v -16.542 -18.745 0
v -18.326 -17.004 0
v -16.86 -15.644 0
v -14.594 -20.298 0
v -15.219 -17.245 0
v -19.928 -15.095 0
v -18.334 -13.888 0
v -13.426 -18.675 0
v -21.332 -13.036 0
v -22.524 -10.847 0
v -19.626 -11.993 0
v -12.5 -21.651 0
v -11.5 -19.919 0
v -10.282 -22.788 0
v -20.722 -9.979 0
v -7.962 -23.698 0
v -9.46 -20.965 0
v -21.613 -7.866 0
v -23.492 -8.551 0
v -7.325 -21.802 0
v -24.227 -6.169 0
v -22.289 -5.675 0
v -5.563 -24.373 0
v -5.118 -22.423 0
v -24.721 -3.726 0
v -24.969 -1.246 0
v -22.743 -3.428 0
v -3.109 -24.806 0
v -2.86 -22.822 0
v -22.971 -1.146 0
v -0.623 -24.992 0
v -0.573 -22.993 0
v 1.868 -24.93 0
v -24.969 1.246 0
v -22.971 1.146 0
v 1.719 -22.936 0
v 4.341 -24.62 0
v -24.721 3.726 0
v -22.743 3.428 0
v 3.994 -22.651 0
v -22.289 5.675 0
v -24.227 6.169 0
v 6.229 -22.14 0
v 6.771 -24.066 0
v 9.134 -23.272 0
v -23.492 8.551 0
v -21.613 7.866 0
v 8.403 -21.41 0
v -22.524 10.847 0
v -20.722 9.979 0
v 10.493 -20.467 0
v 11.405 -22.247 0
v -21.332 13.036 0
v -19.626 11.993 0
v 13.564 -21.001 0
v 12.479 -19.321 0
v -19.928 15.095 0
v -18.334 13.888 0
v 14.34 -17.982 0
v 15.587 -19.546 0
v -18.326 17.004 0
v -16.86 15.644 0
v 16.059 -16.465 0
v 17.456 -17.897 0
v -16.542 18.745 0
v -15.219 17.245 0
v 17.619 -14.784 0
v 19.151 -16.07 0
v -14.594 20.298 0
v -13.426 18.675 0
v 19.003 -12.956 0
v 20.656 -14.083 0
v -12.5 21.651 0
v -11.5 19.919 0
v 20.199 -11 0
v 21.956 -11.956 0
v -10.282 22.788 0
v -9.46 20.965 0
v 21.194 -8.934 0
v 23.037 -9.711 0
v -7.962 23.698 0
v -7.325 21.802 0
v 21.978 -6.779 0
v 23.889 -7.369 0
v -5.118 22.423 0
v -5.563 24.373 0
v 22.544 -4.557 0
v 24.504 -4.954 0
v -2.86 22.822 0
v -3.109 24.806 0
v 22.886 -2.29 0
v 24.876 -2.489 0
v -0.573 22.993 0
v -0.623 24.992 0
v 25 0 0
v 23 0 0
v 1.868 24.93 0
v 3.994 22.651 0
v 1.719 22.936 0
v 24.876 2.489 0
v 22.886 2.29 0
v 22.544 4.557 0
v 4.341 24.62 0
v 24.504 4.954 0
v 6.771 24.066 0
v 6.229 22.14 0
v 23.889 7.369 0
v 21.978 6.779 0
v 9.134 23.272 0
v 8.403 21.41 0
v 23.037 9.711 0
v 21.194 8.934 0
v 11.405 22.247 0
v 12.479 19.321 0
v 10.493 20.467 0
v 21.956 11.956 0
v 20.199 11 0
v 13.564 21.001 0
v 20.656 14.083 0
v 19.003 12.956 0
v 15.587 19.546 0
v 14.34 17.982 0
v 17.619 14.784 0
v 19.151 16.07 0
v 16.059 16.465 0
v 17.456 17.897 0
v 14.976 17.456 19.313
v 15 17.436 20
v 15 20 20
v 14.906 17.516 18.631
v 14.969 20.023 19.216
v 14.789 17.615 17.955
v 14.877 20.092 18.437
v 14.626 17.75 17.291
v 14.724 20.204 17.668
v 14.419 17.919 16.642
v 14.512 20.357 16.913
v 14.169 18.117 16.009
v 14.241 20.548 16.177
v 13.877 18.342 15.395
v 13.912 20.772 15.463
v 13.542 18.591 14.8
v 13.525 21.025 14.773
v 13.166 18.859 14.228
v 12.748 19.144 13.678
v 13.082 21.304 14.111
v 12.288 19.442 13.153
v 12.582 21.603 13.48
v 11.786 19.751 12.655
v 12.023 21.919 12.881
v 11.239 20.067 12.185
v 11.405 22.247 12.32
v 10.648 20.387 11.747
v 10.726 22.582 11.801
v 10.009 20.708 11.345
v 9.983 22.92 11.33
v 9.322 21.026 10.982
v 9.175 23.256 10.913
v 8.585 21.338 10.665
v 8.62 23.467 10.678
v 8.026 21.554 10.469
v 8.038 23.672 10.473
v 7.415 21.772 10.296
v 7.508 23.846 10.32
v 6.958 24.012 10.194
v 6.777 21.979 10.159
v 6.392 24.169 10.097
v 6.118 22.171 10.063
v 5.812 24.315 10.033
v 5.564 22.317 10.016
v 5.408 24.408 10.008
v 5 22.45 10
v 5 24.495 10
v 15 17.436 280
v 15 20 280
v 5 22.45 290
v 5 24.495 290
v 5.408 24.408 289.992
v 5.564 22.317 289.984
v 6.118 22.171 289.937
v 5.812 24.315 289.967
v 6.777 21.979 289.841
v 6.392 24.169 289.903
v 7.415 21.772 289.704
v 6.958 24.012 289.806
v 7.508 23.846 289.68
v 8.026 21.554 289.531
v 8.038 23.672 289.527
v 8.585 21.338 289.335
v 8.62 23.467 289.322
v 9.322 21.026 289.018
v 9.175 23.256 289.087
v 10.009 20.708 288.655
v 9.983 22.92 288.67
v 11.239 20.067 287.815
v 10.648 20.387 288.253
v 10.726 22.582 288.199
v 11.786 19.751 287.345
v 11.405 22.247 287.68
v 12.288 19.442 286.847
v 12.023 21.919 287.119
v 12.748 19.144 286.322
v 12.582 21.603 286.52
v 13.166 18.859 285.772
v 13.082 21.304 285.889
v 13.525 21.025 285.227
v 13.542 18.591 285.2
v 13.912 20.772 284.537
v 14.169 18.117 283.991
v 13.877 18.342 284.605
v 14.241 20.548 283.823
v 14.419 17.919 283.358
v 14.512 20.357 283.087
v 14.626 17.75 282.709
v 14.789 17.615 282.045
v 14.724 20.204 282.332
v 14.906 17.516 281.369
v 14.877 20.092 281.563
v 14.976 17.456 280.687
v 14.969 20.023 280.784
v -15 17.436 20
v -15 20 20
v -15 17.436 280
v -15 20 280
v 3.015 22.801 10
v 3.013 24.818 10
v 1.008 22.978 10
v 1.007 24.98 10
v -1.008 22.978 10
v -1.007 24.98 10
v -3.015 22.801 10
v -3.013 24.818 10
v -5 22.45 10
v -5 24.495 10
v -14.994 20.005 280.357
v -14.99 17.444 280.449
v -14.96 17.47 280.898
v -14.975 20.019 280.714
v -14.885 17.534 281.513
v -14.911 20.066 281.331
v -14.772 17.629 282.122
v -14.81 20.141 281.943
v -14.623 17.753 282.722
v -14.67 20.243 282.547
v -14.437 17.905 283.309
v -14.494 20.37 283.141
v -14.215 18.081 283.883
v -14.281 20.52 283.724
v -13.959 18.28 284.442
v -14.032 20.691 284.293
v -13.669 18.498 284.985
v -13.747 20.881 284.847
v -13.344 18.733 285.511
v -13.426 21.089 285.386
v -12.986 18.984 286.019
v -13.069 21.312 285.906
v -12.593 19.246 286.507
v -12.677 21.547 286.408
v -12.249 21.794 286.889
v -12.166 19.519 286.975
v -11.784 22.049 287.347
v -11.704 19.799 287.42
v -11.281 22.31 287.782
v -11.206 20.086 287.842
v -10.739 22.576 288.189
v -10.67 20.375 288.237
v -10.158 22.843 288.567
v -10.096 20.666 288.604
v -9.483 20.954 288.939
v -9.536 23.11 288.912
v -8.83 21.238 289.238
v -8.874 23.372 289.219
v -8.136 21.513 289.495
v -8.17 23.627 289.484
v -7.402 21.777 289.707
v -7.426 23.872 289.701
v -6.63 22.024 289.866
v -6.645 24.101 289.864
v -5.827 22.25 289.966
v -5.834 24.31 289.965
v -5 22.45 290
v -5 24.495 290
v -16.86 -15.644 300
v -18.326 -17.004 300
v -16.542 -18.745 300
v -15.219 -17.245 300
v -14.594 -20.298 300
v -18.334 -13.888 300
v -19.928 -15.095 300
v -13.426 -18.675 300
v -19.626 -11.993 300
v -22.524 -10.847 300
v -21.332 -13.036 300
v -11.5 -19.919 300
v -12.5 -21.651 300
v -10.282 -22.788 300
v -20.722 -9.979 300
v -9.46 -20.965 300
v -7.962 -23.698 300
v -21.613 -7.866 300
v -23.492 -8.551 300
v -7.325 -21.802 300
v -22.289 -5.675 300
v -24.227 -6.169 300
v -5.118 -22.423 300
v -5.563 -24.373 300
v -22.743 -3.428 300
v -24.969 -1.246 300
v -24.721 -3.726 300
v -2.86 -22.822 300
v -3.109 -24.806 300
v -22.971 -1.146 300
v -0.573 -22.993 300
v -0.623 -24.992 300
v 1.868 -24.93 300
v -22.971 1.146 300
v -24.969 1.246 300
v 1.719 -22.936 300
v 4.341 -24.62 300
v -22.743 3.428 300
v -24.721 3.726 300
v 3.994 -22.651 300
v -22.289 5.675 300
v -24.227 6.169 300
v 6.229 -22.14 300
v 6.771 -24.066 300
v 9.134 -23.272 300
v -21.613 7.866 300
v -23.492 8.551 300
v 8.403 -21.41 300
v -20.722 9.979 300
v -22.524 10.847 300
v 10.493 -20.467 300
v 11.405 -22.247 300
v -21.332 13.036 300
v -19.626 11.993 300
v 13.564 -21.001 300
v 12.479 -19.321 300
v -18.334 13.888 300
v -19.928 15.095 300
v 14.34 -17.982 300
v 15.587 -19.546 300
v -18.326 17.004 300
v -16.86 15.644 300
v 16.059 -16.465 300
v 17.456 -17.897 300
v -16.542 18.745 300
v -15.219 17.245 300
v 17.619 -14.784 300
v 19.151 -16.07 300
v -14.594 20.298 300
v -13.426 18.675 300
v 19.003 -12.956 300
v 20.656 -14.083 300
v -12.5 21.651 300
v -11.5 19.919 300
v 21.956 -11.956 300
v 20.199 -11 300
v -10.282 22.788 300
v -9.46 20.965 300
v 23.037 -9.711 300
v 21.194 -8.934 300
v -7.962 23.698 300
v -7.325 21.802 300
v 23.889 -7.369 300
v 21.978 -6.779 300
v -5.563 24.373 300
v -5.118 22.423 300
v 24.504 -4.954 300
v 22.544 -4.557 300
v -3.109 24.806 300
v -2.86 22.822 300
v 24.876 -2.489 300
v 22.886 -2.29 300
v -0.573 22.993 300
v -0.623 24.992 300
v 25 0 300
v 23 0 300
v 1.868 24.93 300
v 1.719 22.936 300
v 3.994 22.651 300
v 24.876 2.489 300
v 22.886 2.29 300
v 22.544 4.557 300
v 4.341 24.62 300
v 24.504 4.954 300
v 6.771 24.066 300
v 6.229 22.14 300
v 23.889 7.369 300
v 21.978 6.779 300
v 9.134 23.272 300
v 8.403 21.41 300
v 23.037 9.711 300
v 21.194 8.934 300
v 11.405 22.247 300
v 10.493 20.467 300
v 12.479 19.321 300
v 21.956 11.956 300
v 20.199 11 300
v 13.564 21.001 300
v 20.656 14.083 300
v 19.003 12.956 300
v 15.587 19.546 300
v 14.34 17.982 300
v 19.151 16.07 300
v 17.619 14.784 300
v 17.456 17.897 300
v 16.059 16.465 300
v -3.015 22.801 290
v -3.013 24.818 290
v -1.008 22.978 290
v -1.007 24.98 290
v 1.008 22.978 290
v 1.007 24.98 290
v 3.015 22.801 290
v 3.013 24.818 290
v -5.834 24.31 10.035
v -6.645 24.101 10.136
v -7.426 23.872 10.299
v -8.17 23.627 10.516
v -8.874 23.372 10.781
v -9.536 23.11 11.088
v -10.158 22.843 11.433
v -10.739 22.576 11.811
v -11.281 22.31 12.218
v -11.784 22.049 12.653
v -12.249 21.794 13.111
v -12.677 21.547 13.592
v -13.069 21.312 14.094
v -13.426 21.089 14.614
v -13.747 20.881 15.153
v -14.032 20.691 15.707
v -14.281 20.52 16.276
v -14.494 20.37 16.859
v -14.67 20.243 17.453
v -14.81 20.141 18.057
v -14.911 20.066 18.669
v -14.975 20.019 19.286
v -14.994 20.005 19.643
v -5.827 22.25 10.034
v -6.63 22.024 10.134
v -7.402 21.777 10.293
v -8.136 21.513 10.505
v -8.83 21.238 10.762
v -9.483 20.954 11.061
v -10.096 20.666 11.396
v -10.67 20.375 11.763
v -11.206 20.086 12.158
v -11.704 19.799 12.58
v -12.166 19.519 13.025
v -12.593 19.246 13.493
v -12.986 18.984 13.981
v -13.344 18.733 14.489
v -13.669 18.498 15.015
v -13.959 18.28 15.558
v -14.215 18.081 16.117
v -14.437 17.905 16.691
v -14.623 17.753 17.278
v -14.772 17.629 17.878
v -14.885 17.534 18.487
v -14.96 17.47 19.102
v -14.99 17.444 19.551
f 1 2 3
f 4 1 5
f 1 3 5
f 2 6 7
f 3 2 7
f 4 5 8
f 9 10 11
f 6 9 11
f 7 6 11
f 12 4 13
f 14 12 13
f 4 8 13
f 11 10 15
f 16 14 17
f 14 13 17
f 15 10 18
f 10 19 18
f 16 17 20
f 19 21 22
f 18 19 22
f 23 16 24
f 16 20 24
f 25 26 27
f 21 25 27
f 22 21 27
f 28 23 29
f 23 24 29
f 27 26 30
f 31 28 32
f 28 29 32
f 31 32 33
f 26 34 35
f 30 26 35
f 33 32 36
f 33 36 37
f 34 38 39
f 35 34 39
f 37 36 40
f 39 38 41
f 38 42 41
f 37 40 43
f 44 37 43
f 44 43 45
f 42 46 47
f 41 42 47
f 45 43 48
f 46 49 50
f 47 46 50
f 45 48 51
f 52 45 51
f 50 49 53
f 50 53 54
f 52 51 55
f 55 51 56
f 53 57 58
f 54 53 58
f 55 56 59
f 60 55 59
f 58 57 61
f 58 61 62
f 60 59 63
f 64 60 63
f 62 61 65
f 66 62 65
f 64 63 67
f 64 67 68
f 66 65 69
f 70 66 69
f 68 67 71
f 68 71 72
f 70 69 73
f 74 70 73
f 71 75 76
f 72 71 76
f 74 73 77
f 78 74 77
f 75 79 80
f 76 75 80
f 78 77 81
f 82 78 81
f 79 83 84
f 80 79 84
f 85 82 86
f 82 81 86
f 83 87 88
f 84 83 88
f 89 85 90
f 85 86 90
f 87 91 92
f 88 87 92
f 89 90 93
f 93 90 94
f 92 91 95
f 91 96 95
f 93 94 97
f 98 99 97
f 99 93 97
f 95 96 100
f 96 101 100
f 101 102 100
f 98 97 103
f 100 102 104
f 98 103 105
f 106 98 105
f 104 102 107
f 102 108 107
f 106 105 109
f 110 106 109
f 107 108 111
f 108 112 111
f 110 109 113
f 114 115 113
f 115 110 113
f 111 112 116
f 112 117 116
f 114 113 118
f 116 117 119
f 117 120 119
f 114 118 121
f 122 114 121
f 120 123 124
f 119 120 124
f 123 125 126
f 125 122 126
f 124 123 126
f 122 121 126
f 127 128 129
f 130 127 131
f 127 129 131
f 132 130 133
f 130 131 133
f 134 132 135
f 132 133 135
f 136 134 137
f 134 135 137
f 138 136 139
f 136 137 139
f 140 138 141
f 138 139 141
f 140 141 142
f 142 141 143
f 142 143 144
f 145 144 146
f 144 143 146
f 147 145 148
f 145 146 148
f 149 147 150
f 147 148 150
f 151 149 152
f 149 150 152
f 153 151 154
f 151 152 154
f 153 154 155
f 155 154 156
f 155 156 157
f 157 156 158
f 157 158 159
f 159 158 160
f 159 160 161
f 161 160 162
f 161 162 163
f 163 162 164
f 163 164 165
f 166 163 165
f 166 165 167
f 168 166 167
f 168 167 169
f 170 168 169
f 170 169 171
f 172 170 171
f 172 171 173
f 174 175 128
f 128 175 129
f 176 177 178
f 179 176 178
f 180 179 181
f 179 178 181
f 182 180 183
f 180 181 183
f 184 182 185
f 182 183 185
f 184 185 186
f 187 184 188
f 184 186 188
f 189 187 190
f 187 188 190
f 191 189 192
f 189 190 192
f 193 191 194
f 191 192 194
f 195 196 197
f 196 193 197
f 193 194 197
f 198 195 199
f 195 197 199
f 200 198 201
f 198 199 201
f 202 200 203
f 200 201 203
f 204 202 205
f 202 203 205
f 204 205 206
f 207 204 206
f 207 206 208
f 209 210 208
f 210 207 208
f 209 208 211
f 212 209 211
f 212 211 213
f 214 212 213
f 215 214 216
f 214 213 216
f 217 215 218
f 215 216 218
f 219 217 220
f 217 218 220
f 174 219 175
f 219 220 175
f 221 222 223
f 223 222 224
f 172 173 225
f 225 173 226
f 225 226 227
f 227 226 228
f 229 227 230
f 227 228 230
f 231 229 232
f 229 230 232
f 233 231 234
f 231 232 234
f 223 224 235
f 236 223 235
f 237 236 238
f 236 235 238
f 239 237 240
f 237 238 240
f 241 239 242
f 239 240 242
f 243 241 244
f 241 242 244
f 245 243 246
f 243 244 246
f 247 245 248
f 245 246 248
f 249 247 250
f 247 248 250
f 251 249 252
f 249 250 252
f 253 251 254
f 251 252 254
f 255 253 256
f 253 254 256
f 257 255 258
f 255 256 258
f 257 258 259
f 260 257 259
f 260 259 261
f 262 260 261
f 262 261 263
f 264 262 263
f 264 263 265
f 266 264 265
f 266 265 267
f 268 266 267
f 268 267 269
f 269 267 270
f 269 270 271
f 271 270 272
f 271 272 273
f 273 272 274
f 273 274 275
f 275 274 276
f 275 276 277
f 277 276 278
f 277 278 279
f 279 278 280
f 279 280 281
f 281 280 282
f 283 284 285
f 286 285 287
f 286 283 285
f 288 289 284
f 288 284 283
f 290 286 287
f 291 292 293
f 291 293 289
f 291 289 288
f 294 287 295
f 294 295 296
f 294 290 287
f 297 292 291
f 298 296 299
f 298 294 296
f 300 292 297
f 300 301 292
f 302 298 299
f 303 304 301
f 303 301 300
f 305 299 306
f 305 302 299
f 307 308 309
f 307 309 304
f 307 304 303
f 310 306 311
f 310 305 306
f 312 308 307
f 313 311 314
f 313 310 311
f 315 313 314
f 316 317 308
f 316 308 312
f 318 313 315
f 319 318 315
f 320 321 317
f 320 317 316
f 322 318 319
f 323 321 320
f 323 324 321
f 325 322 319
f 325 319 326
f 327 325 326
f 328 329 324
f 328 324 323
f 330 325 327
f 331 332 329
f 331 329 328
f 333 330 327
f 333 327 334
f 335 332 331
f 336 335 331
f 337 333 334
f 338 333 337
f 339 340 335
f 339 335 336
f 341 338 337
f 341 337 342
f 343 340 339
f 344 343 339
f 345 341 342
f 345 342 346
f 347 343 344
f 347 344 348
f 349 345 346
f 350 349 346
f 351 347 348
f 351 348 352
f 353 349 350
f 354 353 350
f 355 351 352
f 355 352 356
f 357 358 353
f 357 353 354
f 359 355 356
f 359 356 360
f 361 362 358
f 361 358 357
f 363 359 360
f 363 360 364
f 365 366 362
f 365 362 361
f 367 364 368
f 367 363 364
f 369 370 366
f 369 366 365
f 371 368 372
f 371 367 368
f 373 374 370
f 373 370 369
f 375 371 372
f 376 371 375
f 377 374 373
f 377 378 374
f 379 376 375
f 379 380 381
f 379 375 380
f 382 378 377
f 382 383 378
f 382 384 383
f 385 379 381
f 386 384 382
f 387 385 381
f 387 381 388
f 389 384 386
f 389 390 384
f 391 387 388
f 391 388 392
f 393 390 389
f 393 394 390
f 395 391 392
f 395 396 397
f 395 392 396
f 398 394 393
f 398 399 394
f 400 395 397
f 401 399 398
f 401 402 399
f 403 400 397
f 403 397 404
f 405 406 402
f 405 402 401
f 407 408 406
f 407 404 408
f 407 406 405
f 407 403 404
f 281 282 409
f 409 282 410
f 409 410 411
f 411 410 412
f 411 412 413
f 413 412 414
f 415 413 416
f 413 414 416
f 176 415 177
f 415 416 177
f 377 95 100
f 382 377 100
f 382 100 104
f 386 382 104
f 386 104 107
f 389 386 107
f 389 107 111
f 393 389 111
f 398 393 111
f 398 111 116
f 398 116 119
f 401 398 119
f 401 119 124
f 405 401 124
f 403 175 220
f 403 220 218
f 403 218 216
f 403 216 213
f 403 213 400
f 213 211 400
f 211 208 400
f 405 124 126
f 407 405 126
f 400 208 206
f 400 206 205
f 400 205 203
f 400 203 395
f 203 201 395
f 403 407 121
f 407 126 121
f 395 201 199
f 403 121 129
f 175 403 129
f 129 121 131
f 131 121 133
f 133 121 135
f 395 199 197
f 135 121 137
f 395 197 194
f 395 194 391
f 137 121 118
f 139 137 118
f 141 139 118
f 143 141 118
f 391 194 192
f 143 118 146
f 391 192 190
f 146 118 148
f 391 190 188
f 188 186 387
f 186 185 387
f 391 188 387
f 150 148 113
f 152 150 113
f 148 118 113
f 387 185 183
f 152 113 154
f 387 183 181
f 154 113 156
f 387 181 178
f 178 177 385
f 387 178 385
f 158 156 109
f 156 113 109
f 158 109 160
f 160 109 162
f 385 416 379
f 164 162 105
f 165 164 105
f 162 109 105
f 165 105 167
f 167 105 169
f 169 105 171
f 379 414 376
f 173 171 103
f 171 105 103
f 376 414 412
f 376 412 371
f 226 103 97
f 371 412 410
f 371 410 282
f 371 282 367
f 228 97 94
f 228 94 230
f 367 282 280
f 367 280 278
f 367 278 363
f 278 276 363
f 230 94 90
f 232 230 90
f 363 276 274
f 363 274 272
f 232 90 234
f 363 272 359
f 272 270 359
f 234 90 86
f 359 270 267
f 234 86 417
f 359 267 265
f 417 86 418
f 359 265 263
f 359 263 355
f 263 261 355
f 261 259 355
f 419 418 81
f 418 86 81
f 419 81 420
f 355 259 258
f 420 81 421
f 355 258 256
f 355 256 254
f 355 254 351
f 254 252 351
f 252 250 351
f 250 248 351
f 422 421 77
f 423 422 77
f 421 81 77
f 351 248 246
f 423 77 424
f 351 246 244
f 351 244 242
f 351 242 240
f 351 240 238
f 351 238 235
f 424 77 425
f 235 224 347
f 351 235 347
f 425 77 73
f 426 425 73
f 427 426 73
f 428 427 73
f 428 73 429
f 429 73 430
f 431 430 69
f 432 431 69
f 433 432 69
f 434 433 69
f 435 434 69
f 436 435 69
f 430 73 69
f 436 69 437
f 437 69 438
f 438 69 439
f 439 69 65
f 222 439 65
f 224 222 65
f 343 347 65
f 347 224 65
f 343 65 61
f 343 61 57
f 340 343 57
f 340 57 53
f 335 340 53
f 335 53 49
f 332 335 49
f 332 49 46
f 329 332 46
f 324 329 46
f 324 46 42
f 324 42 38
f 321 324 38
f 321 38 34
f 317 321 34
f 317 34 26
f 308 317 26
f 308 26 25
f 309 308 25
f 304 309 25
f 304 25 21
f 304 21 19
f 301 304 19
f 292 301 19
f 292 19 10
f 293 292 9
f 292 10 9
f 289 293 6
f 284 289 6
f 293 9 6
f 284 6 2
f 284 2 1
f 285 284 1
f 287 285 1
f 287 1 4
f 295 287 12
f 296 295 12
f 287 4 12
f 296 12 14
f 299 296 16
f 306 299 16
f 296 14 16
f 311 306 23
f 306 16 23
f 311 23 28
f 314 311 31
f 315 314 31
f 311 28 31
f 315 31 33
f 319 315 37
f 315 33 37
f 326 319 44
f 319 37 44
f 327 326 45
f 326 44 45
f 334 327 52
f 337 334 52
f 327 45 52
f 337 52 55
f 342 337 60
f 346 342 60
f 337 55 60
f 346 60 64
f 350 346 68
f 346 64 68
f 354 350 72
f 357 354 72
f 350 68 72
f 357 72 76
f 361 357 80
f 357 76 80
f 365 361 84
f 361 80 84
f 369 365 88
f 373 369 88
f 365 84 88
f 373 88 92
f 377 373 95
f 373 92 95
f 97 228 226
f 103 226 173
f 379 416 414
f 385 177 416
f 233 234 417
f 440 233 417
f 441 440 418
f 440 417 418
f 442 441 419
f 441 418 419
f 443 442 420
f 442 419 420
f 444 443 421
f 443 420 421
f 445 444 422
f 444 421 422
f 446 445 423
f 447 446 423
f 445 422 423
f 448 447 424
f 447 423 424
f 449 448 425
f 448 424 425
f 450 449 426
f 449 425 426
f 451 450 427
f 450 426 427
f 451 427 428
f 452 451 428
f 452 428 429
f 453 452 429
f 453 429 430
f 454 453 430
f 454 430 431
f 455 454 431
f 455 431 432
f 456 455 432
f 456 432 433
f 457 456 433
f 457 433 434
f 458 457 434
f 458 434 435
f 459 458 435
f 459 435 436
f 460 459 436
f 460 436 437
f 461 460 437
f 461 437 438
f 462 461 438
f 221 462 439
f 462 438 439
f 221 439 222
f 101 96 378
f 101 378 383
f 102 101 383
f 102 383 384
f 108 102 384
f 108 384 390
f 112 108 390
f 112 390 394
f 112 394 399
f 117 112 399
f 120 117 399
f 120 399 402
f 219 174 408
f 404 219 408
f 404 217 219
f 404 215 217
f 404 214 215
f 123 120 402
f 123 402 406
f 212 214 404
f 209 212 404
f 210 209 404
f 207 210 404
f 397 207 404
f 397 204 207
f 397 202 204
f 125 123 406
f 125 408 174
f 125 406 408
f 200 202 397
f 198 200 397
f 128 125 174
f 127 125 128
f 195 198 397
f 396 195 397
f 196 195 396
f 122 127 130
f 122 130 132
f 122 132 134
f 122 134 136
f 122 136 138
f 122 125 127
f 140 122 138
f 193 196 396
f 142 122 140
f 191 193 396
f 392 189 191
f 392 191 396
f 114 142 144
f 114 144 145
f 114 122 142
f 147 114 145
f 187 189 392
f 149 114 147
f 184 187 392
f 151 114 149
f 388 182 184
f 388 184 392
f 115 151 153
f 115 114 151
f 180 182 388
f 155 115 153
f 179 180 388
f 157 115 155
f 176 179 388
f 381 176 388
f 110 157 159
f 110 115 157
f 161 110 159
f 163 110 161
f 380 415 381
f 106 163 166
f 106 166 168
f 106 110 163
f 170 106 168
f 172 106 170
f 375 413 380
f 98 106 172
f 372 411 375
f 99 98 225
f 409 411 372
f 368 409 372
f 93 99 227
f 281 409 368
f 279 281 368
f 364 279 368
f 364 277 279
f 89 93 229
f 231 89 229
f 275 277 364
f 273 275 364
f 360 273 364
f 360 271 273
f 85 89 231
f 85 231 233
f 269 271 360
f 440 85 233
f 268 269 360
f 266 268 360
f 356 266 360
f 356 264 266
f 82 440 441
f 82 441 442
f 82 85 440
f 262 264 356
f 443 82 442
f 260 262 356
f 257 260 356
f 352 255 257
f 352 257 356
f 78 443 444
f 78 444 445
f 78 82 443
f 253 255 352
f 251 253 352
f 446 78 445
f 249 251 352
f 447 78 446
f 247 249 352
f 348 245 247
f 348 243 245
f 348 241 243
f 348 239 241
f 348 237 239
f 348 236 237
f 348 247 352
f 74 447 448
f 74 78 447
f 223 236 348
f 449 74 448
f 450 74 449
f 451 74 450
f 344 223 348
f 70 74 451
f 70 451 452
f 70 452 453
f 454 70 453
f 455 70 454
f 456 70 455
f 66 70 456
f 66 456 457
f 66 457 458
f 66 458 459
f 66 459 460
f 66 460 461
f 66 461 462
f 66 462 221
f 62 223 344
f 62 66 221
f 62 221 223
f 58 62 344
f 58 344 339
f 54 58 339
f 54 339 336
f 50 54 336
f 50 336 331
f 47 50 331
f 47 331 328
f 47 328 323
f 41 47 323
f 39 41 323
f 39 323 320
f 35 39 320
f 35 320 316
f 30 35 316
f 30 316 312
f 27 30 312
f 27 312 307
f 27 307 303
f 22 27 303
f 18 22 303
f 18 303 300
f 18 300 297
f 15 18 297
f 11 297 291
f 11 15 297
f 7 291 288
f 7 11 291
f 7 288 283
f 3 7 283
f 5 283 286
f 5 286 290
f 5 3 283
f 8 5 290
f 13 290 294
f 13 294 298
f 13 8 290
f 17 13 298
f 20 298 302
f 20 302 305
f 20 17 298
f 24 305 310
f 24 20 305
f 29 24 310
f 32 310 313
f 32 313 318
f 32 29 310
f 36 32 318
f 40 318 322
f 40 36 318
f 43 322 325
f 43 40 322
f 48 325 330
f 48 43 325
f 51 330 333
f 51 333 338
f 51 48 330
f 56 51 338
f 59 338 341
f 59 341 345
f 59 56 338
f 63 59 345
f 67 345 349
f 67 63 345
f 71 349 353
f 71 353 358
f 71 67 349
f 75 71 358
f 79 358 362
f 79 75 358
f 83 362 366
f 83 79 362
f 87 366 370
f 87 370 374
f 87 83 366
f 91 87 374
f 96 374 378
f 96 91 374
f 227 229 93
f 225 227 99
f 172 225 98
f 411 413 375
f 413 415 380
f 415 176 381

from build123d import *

# Parameters (mm, degrees)
SKETCH1_R           = 25
SKETCH1_R_2         = 23
BOSS_EXTRUDE1_DEPTH = 300
CUT_EXTRUDE1_DEPTH  = 51


with BuildPart() as part:
    # Sketch1 → Boss-Extrude1 (new body)
    with BuildSketch(Plane.XY):
        Circle(SKETCH1_R)
        Circle(SKETCH1_R_2, mode=Mode.SUBTRACT)
    extrude(amount=BOSS_EXTRUDE1_DEPTH)

    # Sketch2 → Cut-Extrude1 (cut)
    with BuildSketch(Plane(origin=(0, 50, 0), x_dir=(1, 0, 0), z_dir=(0, 1, 0))):
        with BuildLine():
            Line((5, -10), (-5, -10))
            ThreePointArc((-5, -10), (-12.071067812, -12.928932188), (-15, -20))
            Line((-15, -20), (-15, -280))
            ThreePointArc((-15, -280), (-12.071067812, -287.071067812), (-5, -290))
            Line((-5, -290), (5, -290))
            ThreePointArc((5, -290), (12.071067812, -287.071067812), (15, -280))
            Line((15, -280), (15, -20))
            ThreePointArc((15, -20), (12.071067812, -12.928932188), (5, -10))
        make_face()
    extrude(amount=-CUT_EXTRUDE1_DEPTH, mode=Mode.SUBTRACT)


solid = part.part
